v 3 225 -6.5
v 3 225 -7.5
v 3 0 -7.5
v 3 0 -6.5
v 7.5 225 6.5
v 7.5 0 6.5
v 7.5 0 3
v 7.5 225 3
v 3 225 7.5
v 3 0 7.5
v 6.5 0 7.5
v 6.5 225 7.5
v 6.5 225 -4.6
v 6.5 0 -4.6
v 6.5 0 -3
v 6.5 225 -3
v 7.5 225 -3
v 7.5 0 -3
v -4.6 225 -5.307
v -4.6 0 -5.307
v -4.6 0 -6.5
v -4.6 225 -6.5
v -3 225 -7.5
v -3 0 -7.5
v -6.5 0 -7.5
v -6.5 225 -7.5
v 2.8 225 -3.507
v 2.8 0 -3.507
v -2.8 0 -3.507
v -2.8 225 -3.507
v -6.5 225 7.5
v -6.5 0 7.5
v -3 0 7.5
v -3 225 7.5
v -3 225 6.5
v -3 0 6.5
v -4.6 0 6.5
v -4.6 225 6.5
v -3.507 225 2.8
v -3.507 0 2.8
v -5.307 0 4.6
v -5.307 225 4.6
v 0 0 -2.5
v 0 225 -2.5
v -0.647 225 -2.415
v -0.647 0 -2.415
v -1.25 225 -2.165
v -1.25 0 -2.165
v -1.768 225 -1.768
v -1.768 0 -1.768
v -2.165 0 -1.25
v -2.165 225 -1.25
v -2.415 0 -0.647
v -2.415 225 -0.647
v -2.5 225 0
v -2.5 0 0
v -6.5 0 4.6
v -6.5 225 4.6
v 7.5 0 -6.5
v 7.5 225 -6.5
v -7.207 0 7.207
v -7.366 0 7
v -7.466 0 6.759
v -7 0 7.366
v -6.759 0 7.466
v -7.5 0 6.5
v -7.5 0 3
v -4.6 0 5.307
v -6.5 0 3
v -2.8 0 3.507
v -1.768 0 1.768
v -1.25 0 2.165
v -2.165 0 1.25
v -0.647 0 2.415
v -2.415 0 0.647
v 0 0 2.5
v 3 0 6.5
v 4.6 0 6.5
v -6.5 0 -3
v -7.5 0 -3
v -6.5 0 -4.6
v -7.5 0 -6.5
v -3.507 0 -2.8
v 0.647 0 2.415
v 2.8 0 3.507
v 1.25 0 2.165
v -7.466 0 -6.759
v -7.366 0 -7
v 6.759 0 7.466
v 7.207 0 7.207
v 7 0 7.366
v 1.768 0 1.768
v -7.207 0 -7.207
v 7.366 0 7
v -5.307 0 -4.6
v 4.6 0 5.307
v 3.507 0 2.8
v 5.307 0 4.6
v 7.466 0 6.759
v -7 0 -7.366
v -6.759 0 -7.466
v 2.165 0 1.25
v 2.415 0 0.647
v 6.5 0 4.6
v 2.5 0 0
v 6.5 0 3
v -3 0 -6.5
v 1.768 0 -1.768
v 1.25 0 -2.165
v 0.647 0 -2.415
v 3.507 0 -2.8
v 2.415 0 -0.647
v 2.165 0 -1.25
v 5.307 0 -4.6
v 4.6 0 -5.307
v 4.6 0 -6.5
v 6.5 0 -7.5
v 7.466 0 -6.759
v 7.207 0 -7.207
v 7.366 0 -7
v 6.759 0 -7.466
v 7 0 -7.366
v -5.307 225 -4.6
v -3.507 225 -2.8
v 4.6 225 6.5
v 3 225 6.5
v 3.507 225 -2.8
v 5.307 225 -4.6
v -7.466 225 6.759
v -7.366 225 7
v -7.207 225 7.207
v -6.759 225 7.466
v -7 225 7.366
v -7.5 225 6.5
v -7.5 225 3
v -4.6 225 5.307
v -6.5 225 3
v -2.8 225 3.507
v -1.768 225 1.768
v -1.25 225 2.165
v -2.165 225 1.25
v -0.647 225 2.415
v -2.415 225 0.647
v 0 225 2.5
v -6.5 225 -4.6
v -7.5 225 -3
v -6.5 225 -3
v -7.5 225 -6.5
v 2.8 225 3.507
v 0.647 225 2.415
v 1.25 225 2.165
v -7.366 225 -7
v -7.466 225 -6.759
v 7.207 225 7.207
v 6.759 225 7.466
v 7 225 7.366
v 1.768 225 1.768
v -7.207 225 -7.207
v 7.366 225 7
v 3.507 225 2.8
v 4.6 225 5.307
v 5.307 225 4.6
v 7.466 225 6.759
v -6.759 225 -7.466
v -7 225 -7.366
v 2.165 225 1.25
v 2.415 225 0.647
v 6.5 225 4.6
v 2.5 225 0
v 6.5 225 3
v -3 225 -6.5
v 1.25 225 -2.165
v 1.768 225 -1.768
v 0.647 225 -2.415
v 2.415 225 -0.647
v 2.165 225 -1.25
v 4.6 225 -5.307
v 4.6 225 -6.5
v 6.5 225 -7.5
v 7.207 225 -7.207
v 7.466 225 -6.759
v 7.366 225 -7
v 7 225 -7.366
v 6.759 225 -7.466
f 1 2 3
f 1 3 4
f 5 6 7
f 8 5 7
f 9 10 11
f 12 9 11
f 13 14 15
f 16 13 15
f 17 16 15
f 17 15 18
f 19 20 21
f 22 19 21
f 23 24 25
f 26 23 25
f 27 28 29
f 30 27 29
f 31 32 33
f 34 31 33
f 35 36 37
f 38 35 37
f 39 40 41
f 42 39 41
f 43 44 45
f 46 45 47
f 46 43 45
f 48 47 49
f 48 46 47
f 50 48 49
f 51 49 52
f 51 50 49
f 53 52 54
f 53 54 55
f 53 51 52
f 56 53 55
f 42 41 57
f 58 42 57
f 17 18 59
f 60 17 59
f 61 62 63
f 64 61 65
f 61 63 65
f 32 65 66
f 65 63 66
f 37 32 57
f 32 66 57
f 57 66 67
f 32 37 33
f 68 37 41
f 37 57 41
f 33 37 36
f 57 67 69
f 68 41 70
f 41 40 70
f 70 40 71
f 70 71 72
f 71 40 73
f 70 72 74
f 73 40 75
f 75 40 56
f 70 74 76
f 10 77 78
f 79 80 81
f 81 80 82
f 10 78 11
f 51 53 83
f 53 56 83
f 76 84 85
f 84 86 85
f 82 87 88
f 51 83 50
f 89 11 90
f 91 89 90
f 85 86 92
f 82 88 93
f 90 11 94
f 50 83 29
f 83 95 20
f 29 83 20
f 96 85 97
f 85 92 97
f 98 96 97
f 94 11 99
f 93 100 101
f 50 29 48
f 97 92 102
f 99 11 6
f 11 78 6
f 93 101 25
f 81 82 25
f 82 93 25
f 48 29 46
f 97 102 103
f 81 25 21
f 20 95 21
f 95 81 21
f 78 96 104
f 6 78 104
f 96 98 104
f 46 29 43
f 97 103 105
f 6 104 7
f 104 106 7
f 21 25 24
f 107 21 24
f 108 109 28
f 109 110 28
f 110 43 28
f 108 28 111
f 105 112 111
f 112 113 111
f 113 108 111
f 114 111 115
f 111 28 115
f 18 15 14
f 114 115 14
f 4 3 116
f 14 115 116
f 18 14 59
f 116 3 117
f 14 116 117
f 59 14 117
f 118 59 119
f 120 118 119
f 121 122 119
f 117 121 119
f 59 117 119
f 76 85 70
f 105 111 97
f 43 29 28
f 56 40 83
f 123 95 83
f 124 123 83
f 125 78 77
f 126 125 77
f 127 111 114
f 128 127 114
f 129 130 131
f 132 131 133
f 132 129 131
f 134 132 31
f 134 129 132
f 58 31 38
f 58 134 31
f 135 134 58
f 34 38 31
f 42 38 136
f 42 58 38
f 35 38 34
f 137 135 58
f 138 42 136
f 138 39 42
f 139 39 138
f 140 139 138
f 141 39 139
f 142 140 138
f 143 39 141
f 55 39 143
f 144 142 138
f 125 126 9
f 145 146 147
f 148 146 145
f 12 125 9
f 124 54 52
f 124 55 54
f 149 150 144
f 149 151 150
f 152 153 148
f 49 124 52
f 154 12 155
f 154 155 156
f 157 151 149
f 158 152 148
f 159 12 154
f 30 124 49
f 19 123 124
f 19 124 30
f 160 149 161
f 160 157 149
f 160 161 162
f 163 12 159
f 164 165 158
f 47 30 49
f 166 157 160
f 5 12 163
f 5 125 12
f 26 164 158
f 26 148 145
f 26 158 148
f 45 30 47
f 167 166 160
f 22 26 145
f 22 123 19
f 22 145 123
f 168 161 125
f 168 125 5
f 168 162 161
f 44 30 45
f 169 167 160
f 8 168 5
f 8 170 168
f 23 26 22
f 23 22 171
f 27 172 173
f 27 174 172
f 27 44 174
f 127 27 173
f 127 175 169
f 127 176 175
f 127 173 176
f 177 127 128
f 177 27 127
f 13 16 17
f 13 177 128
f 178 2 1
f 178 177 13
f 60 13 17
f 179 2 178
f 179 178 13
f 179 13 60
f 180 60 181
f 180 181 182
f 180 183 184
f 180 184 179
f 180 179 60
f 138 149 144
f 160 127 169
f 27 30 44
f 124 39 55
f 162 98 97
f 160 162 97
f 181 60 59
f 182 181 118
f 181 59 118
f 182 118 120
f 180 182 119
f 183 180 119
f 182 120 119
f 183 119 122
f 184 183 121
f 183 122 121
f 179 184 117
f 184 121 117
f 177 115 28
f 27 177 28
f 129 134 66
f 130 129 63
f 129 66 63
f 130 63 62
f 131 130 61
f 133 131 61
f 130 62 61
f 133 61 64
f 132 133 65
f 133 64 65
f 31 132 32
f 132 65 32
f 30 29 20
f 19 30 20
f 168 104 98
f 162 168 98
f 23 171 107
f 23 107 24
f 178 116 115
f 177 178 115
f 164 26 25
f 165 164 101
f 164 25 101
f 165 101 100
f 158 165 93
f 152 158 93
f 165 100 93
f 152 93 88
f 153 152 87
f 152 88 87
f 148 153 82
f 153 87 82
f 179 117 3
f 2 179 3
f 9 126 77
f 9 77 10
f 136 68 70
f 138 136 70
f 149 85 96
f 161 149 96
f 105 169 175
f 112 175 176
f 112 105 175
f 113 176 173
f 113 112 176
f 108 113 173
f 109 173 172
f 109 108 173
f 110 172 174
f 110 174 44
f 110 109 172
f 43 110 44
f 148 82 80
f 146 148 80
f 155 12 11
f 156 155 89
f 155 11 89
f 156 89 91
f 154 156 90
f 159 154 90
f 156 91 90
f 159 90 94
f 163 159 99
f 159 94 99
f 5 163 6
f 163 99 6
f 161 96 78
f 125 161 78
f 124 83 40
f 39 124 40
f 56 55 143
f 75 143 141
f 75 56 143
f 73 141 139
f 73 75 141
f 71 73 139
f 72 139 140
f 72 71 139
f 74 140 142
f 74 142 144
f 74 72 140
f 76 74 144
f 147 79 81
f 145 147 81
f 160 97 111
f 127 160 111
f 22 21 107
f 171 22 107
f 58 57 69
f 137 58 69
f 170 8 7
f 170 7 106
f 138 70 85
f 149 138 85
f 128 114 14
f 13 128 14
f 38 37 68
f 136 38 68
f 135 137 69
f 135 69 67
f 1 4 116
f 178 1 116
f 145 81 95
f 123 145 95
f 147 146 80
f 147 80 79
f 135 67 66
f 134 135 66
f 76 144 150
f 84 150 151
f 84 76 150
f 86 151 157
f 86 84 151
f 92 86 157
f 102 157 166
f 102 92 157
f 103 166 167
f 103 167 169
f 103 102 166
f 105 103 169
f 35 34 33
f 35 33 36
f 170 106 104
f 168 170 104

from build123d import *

# Parameters (mm, degrees)
BOSS_EXTRUDE1_DEPTH = 225


with BuildPart() as part:
    # Sketch1 → Boss-Extrude1 (new body)
    with BuildSketch(Plane(origin=(0, 0, 0), x_dir=(1, 0, 0), z_dir=(0, 1, 0))):
        with BuildLine():
            Line((-7.5, -3), (-7.5, -6.5))
            ThreePointArc((-7.5, -6.5), (-7.207106781, -7.207106781), (-6.5, -7.5))
            Line((-6.5, -7.5), (-3, -7.5))
            Line((-3, -7.5), (-3, -6.5))
            Line((-3, -6.5), (-4.6, -6.5))
            Line((-4.6, -6.5), (-4.6, -5.307106781))
            Line((-4.6, -5.307106781), (-2.8, -3.507106781))
            Line((-2.8, -3.507106781), (0, -3.507106781))
            Line((0, -3.507106781), (2.8, -3.507106781))
            Line((2.8, -3.507106781), (4.6, -5.307106781))
            Line((4.6, -5.307106781), (4.6, -6.5))
            Line((4.6, -6.5), (3, -6.5))
            Line((3, -6.5), (3, -7.5))
            Line((3, -7.5), (6.5, -7.5))
            ThreePointArc((6.5, -7.5), (7.207106781, -7.207106781), (7.5, -6.5))
            Line((7.5, -6.5), (7.5, -3))
            Line((7.5, -3), (6.5, -3))
            Line((6.5, -3), (6.5, -4.6))
            Line((6.5, -4.6), (5.307106781, -4.6))
            Line((5.307106781, -4.6), (3.507106781, -2.8))
            Line((3.507106781, -2.8), (3.507106781, 0))
            Line((3.507106781, 0), (3.507106781, 2.8))
            Line((3.507106781, 2.8), (5.307106781, 4.6))
            Line((5.307106781, 4.6), (6.5, 4.6))
            Line((6.5, 4.6), (6.5, 3))
            Line((6.5, 3), (7.5, 3))
            Line((7.5, 3), (7.5, 6.5))
            ThreePointArc((7.5, 6.5), (7.207106781, 7.207106781), (6.5, 7.5))
            Line((6.5, 7.5), (3, 7.5))
            Line((3, 7.5), (3, 6.5))
            Line((3, 6.5), (4.6, 6.5))
            Line((4.6, 6.5), (4.6, 5.307106781))
            Line((4.6, 5.307106781), (2.8, 3.507106781))
            Line((2.8, 3.507106781), (0, 3.507106781))
            Line((0, 3.507106781), (-2.8, 3.507106781))
            Line((-2.8, 3.507106781), (-4.6, 5.307106781))
            Line((-4.6, 5.307106781), (-4.6, 6.5))
            Line((-4.6, 6.5), (-3, 6.5))
            Line((-3, 6.5), (-3, 7.5))
            Line((-3, 7.5), (-6.5, 7.5))
            ThreePointArc((-6.5, 7.5), (-7.207106781, 7.207106781), (-7.5, 6.5))
            Line((-7.5, 6.5), (-7.5, 3))
            Line((-7.5, 3), (-6.5, 3))
            Line((-6.5, 3), (-6.5, 4.6))
            Line((-6.5, 4.6), (-5.307106781, 4.6))
            Line((-5.307106781, 4.6), (-3.507106781, 2.8))
            Line((-3.507106781, 2.8), (-3.507106781, 0))
            Line((-3.507106781, 0), (-3.507106781, -2.8))
            Line((-3.507106781, -2.8), (-5.307106781, -4.6))
            Line((-5.307106781, -4.6), (-6.5, -4.6))
            Line((-6.5, -4.6), (-6.5, -3))
            Line((-6.5, -3), (-7.5, -3))
        make_face()
        with BuildLine():
            ThreePointArc((-2.5, 0), (-1.767766953, -1.767766953), (0, -2.5))
            ThreePointArc((0, -2.5), (1.767766953, -1.767766953), (2.5, 0))
            ThreePointArc((2.5, 0), (1.767766953, 1.767766953), (0, 2.5))
            ThreePointArc((0, 2.5), (-1.767766953, 1.767766953), (-2.5, 0))
        make_face(mode=Mode.SUBTRACT)
    extrude(amount=BOSS_EXTRUDE1_DEPTH)


solid = part.part
